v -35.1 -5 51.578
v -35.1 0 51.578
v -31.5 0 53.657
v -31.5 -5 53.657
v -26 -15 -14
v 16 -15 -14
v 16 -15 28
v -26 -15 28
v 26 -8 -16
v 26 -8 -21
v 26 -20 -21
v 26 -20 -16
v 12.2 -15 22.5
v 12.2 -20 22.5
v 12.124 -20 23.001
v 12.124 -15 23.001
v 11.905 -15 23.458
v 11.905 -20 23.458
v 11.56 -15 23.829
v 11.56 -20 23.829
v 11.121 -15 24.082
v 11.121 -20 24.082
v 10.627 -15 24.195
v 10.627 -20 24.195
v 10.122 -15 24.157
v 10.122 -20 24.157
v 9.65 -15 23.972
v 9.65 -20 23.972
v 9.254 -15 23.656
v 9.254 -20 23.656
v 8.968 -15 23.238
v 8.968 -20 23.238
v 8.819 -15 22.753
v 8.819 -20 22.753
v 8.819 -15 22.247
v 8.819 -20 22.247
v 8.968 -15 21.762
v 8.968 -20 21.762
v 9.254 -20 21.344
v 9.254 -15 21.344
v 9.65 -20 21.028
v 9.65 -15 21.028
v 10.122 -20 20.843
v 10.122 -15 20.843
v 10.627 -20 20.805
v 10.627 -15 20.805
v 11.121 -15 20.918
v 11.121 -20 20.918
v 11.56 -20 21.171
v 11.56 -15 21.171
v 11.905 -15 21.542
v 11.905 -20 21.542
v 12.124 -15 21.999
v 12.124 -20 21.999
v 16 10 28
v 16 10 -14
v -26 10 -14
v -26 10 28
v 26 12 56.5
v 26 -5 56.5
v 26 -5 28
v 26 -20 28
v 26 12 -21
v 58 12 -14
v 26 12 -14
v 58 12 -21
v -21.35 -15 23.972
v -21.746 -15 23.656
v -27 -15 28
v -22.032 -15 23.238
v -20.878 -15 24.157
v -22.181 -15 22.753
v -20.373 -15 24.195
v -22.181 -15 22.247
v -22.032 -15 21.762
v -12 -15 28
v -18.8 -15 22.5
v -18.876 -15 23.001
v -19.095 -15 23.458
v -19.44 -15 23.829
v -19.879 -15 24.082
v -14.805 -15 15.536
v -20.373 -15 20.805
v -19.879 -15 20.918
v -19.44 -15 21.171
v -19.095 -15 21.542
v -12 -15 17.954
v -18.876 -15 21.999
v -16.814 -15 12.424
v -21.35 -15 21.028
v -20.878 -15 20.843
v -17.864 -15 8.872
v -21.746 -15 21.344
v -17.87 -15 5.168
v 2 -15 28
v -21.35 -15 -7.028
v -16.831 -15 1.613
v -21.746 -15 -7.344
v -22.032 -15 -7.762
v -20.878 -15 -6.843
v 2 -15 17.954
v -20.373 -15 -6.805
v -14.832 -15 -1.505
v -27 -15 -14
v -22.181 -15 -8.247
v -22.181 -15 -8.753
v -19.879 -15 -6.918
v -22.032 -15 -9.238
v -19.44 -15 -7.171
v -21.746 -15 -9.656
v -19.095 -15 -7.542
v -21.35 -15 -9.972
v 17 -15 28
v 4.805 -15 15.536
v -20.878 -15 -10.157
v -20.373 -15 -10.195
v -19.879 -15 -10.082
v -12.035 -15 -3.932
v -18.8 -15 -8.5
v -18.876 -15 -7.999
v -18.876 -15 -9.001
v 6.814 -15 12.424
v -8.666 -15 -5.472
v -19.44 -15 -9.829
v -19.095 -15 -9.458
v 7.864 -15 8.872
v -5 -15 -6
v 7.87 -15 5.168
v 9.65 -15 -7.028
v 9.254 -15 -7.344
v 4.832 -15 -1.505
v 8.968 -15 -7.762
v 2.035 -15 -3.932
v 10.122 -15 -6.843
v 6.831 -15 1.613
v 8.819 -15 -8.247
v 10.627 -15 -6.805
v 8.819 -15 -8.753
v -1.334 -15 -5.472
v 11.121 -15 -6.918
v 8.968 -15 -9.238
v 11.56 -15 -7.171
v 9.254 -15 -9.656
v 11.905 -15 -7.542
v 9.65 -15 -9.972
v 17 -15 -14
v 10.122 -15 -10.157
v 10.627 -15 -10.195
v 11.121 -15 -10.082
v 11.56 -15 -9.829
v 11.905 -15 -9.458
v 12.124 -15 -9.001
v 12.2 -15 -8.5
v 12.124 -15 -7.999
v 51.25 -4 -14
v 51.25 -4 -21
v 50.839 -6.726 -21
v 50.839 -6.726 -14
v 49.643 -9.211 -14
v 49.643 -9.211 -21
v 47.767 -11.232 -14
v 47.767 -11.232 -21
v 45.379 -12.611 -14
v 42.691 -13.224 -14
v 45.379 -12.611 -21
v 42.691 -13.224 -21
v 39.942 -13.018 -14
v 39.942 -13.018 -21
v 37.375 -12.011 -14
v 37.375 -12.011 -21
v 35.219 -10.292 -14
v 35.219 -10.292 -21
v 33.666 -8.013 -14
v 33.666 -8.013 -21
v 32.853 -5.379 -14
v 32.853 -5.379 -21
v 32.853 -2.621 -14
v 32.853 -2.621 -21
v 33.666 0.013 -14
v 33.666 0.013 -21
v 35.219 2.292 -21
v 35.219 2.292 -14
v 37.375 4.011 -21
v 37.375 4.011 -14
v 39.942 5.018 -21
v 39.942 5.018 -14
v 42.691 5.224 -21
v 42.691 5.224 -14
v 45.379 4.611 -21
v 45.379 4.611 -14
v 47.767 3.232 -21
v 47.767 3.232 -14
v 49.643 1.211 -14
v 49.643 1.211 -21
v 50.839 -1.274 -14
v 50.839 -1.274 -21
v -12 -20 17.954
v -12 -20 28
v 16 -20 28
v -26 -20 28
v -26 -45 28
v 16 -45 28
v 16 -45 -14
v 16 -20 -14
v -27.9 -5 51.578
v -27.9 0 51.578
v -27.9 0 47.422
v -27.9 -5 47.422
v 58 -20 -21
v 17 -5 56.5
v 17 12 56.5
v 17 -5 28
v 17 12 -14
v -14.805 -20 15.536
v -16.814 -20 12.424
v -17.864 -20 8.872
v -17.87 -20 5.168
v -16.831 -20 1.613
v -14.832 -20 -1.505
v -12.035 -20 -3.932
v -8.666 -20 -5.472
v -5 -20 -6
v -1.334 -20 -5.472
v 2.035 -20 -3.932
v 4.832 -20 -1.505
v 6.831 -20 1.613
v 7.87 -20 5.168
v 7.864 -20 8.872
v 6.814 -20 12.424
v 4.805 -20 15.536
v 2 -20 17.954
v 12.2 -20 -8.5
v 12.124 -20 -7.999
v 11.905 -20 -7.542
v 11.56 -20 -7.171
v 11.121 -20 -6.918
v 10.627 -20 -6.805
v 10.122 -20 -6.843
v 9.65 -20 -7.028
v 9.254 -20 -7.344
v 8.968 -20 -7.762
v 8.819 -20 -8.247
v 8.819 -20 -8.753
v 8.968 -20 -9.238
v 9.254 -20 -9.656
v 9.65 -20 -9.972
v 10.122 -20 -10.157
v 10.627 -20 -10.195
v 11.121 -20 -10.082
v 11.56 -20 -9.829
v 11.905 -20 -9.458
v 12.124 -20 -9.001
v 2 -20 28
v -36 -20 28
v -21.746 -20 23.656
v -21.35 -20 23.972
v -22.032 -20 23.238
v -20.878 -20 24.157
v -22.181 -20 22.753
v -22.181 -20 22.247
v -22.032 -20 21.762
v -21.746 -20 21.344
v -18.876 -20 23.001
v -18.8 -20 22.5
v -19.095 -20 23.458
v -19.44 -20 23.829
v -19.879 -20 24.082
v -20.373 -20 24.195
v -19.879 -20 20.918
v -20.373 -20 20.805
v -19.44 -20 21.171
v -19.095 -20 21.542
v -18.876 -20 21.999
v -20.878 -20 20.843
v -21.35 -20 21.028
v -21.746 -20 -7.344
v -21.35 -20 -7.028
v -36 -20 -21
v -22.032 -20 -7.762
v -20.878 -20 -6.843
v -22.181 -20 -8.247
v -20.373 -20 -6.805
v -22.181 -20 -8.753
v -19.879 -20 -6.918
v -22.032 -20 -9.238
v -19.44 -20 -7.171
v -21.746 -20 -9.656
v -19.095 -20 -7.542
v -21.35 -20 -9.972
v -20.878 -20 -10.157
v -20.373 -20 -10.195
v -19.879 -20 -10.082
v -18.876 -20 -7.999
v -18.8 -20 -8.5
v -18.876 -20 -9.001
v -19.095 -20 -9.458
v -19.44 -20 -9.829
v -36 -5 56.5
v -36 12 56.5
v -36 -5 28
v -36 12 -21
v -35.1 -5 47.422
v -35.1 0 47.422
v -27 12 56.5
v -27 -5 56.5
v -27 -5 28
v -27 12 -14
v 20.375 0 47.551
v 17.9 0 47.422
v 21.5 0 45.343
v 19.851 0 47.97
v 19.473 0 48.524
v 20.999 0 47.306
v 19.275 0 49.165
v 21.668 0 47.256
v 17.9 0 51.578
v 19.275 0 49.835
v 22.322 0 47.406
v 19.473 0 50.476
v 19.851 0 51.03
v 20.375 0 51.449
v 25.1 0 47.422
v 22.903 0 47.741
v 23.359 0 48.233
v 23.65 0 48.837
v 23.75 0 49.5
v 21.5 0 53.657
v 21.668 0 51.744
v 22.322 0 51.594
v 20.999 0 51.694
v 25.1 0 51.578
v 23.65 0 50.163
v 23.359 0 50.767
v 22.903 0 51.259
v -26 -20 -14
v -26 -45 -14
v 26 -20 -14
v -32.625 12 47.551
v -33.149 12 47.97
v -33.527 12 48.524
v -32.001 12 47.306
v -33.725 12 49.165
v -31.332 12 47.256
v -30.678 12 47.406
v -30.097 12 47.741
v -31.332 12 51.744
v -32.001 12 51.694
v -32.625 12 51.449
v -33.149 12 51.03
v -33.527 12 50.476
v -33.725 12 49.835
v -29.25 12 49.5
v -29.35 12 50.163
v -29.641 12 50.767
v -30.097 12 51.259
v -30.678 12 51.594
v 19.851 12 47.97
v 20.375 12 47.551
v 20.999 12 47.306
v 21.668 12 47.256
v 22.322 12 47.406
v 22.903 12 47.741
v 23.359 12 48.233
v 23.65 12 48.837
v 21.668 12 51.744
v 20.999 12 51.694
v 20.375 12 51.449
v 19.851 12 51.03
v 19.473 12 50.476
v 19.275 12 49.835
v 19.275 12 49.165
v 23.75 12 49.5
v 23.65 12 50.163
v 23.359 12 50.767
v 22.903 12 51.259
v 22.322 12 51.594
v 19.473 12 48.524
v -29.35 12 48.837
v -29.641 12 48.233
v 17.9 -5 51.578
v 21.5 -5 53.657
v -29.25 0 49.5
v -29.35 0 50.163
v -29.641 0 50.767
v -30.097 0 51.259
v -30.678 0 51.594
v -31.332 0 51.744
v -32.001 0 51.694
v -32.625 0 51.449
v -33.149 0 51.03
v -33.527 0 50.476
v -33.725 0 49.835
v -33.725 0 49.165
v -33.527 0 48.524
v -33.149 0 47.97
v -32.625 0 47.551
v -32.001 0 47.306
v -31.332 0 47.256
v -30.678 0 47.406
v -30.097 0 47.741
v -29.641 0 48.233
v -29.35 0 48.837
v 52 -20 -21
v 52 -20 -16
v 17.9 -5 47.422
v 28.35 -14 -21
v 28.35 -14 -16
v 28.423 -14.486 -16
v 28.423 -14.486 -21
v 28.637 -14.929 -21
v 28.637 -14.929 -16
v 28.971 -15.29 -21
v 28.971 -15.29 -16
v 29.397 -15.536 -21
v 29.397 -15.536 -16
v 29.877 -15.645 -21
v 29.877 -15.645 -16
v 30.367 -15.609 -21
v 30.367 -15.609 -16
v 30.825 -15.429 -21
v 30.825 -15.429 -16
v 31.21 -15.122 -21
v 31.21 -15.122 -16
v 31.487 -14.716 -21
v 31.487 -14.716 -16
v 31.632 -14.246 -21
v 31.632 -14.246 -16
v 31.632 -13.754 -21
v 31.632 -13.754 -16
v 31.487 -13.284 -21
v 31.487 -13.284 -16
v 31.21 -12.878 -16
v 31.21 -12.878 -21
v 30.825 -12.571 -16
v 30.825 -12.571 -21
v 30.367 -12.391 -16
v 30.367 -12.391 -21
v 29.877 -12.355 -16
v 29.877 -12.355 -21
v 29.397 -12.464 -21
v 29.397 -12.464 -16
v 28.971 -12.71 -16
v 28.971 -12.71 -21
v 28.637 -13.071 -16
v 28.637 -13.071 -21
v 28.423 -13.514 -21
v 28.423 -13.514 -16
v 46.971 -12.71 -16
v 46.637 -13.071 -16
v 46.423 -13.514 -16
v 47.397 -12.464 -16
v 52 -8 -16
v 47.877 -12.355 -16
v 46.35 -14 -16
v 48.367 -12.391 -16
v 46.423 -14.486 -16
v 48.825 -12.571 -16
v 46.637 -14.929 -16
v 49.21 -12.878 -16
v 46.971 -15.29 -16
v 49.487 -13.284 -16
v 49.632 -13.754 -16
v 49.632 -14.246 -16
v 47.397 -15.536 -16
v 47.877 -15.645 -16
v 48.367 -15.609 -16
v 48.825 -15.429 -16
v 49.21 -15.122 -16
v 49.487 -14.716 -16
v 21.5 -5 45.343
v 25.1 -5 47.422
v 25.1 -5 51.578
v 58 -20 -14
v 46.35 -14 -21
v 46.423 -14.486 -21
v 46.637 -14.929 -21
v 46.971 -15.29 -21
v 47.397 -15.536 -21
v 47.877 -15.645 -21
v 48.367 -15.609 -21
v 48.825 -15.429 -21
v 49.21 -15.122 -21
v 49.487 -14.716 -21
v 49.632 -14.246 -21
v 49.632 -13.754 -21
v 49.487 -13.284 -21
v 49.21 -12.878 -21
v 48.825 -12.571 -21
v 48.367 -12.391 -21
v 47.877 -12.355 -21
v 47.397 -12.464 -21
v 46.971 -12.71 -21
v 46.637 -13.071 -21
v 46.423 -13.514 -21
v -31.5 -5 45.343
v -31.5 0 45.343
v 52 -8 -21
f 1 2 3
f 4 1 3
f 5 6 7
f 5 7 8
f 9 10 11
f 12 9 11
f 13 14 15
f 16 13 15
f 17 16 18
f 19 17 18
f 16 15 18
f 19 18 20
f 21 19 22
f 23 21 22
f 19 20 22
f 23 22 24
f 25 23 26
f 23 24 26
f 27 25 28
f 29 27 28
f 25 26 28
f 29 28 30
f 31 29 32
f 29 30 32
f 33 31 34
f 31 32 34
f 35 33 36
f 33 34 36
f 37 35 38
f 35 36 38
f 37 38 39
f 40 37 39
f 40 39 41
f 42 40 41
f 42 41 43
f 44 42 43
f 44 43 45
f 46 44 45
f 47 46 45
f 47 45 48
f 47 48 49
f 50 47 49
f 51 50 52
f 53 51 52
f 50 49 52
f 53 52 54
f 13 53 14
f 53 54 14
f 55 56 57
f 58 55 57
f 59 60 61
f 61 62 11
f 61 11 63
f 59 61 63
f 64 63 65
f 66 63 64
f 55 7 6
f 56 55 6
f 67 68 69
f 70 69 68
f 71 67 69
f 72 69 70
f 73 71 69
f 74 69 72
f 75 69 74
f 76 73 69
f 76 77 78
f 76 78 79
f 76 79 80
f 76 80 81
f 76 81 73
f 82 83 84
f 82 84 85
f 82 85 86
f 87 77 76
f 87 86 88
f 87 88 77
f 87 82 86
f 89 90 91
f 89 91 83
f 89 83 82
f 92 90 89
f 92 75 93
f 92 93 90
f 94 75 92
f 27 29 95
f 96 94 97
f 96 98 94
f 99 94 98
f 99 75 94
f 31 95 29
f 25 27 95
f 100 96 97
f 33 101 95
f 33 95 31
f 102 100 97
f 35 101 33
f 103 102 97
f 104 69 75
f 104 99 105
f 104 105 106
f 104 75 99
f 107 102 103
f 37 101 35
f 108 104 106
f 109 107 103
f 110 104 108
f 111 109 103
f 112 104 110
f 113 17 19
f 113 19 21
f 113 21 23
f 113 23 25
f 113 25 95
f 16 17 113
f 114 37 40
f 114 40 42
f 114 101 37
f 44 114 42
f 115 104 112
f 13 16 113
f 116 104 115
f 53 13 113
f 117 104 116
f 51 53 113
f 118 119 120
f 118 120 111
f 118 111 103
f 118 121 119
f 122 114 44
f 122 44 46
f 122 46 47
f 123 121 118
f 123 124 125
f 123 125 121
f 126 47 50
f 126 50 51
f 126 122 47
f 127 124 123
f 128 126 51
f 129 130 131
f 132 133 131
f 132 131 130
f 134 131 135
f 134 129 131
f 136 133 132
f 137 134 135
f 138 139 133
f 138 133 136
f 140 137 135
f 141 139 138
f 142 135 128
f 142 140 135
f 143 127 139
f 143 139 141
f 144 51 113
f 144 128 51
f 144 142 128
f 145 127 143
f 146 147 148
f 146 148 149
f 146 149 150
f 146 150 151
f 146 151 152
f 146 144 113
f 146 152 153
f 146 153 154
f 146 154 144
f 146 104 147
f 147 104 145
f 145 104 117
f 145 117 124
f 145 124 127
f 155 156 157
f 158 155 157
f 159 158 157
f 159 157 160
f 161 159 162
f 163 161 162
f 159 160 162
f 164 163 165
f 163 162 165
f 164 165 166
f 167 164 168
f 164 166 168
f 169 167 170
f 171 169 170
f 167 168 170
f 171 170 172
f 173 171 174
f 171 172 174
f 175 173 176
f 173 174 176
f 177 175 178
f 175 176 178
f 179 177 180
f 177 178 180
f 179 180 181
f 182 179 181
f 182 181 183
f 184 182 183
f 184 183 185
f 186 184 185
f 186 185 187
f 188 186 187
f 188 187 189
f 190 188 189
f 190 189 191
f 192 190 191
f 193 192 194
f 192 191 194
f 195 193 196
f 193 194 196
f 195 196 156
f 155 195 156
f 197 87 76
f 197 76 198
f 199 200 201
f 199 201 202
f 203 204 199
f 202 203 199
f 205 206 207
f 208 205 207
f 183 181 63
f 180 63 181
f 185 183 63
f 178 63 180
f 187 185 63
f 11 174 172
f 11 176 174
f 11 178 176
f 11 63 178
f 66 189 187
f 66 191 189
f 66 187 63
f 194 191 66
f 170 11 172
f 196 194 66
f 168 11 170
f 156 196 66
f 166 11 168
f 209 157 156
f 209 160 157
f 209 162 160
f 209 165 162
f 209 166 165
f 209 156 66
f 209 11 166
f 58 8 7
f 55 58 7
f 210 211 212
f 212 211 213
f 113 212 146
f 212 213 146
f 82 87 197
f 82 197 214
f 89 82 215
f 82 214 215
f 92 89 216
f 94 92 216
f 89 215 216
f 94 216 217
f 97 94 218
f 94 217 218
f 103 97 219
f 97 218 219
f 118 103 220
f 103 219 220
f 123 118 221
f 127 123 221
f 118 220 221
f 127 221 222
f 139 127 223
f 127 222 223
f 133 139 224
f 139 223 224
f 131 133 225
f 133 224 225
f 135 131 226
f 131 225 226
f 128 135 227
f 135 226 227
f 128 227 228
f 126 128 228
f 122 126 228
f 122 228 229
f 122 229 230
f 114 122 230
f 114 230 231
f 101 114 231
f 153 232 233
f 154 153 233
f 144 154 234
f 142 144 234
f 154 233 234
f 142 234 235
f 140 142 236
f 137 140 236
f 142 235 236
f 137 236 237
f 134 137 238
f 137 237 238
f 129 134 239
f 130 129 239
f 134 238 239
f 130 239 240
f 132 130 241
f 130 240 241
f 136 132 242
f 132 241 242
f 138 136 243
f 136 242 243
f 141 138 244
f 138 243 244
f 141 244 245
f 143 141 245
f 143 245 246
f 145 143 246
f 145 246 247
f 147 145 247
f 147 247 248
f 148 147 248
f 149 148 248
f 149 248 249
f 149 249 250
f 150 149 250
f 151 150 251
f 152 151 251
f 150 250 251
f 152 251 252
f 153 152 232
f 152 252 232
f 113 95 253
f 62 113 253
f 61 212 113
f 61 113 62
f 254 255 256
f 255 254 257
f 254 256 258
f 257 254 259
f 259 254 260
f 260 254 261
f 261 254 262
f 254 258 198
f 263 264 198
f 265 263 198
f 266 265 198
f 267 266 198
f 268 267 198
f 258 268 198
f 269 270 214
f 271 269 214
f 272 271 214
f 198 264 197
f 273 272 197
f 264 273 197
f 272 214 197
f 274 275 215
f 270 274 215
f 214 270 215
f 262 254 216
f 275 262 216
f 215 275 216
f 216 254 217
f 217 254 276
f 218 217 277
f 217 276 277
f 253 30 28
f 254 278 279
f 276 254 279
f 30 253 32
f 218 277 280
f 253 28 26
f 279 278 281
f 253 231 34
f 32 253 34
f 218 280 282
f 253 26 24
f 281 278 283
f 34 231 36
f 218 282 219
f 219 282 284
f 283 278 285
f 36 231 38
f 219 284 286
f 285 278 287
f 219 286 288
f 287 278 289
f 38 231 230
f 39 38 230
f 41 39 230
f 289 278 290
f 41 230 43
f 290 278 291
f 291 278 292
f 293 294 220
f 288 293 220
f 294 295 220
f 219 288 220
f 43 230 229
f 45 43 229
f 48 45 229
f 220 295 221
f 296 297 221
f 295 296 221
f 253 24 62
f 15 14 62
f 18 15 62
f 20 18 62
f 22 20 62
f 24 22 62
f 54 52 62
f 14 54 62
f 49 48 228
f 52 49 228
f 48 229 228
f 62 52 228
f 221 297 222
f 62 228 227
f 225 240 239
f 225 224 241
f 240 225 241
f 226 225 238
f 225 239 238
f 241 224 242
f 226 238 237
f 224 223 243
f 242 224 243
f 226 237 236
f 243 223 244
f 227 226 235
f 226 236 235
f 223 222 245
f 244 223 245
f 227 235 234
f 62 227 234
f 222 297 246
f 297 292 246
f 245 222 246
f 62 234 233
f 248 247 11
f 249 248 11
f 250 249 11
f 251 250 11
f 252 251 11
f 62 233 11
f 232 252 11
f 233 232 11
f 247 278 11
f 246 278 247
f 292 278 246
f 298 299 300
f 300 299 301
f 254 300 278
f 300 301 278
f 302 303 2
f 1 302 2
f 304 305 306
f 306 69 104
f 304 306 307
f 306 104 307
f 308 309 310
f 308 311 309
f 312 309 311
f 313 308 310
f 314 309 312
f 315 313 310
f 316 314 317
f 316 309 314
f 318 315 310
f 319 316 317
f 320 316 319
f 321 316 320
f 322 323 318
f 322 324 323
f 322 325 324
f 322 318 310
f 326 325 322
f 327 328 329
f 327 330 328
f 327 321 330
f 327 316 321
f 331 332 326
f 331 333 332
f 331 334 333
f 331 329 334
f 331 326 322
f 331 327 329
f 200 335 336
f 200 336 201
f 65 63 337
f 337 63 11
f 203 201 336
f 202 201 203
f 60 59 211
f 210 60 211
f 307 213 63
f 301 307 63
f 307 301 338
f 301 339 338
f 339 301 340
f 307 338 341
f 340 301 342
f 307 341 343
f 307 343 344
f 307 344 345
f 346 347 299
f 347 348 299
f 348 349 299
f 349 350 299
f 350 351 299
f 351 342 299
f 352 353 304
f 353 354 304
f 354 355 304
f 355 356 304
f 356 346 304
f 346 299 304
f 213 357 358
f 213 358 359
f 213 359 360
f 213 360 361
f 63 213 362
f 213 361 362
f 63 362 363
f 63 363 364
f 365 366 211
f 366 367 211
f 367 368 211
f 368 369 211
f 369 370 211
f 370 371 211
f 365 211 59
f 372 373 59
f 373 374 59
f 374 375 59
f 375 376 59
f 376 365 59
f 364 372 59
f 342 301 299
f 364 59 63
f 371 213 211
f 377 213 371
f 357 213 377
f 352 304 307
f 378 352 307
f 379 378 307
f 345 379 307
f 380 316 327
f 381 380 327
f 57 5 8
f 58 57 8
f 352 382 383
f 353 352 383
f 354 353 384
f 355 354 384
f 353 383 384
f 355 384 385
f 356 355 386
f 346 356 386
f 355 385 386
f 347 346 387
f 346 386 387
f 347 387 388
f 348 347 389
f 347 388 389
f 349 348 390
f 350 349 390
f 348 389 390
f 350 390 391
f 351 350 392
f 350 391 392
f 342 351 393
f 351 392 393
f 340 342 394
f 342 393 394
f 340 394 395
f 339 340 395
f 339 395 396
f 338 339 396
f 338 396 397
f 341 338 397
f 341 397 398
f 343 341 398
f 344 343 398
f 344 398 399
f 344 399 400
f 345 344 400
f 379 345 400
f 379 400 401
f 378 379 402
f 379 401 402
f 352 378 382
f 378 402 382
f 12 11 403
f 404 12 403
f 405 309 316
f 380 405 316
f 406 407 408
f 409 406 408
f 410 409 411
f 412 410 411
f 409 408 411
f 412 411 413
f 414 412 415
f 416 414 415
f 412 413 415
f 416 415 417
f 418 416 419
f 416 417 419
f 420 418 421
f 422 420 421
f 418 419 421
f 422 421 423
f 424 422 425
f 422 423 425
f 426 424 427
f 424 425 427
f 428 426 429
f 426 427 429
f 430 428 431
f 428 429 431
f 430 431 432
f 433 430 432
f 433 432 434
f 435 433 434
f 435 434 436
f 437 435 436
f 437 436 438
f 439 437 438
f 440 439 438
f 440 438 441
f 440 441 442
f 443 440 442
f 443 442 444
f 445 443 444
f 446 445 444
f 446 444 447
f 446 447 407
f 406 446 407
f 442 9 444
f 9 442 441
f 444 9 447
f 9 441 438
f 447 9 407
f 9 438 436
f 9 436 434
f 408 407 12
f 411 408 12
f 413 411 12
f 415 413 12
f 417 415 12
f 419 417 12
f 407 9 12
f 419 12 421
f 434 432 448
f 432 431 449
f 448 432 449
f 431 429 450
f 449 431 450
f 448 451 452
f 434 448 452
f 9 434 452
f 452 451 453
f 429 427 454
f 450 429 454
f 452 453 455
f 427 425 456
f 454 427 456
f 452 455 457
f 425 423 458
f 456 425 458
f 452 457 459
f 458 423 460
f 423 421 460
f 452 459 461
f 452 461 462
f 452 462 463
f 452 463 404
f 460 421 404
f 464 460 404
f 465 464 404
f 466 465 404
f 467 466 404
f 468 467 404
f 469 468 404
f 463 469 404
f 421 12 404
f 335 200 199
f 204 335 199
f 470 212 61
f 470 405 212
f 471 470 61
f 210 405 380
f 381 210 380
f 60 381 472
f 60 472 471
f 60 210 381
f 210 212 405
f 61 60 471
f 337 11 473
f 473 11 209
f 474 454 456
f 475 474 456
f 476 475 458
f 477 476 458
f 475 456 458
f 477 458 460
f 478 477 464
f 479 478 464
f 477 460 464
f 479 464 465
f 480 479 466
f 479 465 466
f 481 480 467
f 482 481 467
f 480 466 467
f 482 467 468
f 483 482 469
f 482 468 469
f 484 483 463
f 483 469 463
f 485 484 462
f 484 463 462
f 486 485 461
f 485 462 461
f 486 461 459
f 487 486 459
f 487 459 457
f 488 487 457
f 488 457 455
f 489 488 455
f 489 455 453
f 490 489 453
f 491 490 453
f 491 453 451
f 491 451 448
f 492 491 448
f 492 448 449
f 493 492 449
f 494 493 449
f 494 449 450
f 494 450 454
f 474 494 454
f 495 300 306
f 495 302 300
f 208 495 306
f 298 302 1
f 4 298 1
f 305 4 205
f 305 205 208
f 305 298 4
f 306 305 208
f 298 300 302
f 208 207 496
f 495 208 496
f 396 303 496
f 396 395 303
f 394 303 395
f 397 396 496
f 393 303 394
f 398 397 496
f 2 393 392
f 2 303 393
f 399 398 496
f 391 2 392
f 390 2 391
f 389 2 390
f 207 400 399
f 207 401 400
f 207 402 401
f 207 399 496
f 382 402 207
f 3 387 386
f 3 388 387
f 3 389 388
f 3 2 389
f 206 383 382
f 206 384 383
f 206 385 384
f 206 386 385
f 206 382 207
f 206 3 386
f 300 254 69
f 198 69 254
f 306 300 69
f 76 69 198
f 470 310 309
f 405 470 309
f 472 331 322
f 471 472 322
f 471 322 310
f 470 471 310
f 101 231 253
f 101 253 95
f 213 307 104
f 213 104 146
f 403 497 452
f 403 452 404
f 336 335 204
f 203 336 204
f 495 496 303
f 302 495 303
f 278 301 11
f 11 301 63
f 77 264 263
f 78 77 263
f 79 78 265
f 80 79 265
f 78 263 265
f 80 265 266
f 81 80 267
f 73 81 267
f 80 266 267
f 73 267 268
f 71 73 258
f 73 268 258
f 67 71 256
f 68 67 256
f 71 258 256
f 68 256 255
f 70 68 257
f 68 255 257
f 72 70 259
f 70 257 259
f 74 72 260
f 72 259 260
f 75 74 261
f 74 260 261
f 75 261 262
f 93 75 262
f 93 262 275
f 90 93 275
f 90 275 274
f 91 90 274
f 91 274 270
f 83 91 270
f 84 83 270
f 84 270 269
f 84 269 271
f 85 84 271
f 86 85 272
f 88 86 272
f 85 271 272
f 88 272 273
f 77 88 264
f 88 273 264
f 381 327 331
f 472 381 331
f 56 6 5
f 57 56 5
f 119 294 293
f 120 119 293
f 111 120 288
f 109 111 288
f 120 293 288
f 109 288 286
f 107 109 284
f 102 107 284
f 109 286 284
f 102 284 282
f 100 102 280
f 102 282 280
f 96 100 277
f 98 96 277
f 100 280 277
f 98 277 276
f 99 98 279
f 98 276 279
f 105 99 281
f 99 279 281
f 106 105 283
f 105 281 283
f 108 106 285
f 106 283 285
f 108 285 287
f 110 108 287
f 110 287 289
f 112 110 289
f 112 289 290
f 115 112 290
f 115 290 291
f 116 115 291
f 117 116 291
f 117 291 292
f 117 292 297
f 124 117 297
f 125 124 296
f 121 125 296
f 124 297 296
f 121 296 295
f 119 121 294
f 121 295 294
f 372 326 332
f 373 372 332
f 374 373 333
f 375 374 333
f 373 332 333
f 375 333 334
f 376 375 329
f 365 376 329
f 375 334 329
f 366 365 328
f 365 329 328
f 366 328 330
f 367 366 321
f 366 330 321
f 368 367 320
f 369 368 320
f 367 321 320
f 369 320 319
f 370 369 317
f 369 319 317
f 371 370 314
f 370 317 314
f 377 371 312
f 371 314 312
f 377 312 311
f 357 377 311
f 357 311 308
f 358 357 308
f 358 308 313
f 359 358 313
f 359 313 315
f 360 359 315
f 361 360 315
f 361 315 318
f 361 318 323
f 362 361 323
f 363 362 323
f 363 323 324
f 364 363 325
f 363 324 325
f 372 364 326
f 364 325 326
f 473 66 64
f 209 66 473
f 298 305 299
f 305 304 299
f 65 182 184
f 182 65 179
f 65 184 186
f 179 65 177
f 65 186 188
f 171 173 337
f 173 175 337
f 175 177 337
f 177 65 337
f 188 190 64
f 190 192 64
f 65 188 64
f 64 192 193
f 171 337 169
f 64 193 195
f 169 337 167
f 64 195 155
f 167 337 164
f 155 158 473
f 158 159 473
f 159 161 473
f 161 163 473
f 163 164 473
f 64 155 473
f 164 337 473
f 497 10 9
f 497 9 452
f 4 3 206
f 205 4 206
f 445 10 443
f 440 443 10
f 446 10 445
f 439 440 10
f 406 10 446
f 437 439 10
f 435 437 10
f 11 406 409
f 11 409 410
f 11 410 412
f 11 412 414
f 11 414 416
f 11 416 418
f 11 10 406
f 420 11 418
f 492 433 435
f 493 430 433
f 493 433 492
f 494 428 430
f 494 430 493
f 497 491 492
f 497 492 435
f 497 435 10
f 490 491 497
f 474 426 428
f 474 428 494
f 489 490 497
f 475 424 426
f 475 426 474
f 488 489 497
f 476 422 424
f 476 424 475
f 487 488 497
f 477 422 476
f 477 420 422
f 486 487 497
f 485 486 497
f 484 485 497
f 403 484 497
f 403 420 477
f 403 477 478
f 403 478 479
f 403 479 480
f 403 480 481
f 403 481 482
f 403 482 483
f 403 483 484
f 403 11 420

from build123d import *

# Parameters (mm, degrees)
F1_R      = 2.25
F2_DEPTH  = 12
F4_DEPTH  = 5
F5_W      = 44
F5_H      = 10
F5_H_2    = 5
F6_DEPTH  = 7
F7_DEPTH  = 42
F8_R      = 1.7
F8_R_2    = 13
F9_DEPTH  = 5
F11_REACH = 63.8670687473
F12_R     = 1.7
F13_DEPTH = 25
F14_W     = 42
F14_H     = 42
F14_R     = 1.7
F14_R_2   = 13
F15_DEPTH = 25
F16_W     = 32
F16_H     = 32
F16_R     = 9.25
F17_DEPTH = 7
F18_W     = 26
F18_H     = 12
F19_DEPTH = 5
F20_D     = 3.3


with BuildPart() as f2:
    # F1 (on Front) → F2 (new body)
    with BuildSketch(Plane.XZ):
        Polygon((-27, 56.5), (-36, 56.5), (-36, -21), (26, -21), (26, 56.5), (17, 56.5), (17, -14), (-27, -14), align=None)
        with Locations((-31.5, 49.5)):
            Circle(F1_R, mode=Mode.SUBTRACT)
        with Locations((21.5, 49.5)):
            Circle(F1_R, mode=Mode.SUBTRACT)
    extrude(amount=-F2_DEPTH)

    # F3 (on face) → F4 (join)
    with BuildSketch(Plane.XZ):
        Polygon((-27, -14), (-27, 56.5), (-36, 56.5), (-36, -21), (26, -21), (26, 56.5), (17, 56.5), (17, -14), align=None)
        Polygon((-31.5, 53.6569219382), (-27.9, 51.5784609691), (-27.9, 47.4215390309), (-31.5, 45.3430780618), (-35.1, 47.4215390309), (-35.1, 51.5784609691), align=None, mode=Mode.SUBTRACT)
        Polygon((21.5, 53.6569219382), (25.1, 51.5784609691), (25.1, 47.4215390309), (21.5, 45.3430780618), (17.9, 47.4215390309), (17.9, 51.5784609691), align=None, mode=Mode.SUBTRACT)
    extrude(amount=F4_DEPTH)

    # F5 (on face) → F6 (join, through all)
    with BuildSketch(Plane.XY.offset(-14)):
        with Locations((-5, -10)):
            Rectangle(F5_W, F5_H)
        with Locations((-5, -17.5)):
            Rectangle(F5_W, F5_H_2)
        Polygon((-27, -15), (-27, -5), (-36, -5), (-36, -20), (-27, -20), align=None)
        Polygon((26, -5), (17, -5), (17, -15), (17, -20), (26, -20), align=None)
    extrude(amount=-F6_DEPTH)

    # F5 (on face) → F7 (join)
    with BuildSketch(Plane.XY.offset(-14)):
        with Locations((-5, -17.5)):
            Rectangle(F5_W, F5_H_2)
        Polygon((-27, -15), (-27, -5), (-36, -5), (-36, -20), (-27, -20), align=None)
        Polygon((26, -5), (17, -5), (17, -15), (17, -20), (26, -20), align=None)
    extrude(amount=F7_DEPTH)

    # F8 (on face) → F9 (cut, through all)
    with BuildSketch(Plane.XZ.offset(20)):
        with Locations((-20.5, 22.5)):
            Circle(F8_R)
        with Locations((-5, 7)):
            Circle(F8_R_2)
        with Locations((-20.5, -8.5)):
            Circle(F8_R)
        with Locations((10.5, -8.5)):
            Circle(F8_R)
        with Locations((10.5, 22.5)):
            Circle(F8_R)
    extrude(amount=-F9_DEPTH, mode=Mode.SUBTRACT)

    f11_end = f2.faces().sort_by_distance((-18, -17.5, 7))[0]
    # F10 (on face) → F11 (cut, up to a face of the model that its end follows)
    with BuildSketch(Plane.XY.offset(28)):
        Polygon((2, -15), (-5, -15), (-12, -15), (-12, -20), (2, -20), align=None)
    f11_long = extrude(amount=-F11_REACH, mode=Mode.PRIVATE)
    add(split(f11_long, bisect_by=f11_end, keep=Keep.ALL, mode=Mode.PRIVATE).solids().sort_by_distance((-5, -17.5, 28))[0], mode=Mode.SUBTRACT)


with BuildPart() as f13:
    # F12 (on face) → F13 (new body)
    with BuildSketch(Plane(origin=(0, -15, 0), x_dir=(-1, 0, 0), z_dir=(0, 1, 0))):
        with BuildLine():
            Line((-16, -14), (26, -14))
            Line((26, -14), (26, 28))
            Line((26, 28), (12, 28))
            Line((12, 28), (12, 17.9544511501))
            ThreePointArc((12, 17.9544511501), (5, -6), (-2, 17.9544511501))
            Line((-2, 17.9544511501), (-2, 28))
            Line((-2, 28), (-16, 28))
            Line((-16, 28), (-16, -14))
        make_face()
        with Locations((-10.5, -8.5)):
            Circle(F12_R, mode=Mode.SUBTRACT)
        with Locations((20.5, -8.5)):
            Circle(F12_R, mode=Mode.SUBTRACT)
        with Locations((-10.5, 22.5)):
            Circle(F12_R, mode=Mode.SUBTRACT)
        with Locations((20.5, 22.5)):
            Circle(F12_R, mode=Mode.SUBTRACT)
        with BuildLine():
            Line((12, 17.9544511501), (12, 28))
            Line((12, 28), (-2, 28))
            Line((-2, 28), (-2, 17.9544511501))
            ThreePointArc((-2, 17.9544511501), (5, -6), (12, 17.9544511501))
        make_face()
        with Locations((-10.5, 22.5)):
            Circle(F12_R)
        with Locations((20.5, 22.5)):
            Circle(F12_R)
        with Locations((-10.5, -8.5)):
            Circle(F12_R)
        with Locations((20.5, -8.5)):
            Circle(F12_R)
    extrude(amount=F13_DEPTH)


with BuildPart() as f15:
    # F14 (on face) → F15 (new body)
    with BuildSketch(Plane.XZ.offset(20)):
        with Locations((-5, 7)):
            Rectangle(F14_W, F14_H)
        with Locations((-20.5, -8.5)):
            Circle(F14_R, mode=Mode.SUBTRACT)
        with Locations((10.5, -8.5)):
            Circle(F14_R, mode=Mode.SUBTRACT)
        with Locations((-20.5, 22.5)):
            Circle(F14_R, mode=Mode.SUBTRACT)
        with Locations((-5, 7)):
            Circle(F14_R_2, mode=Mode.SUBTRACT)
        with Locations((10.5, 22.5)):
            Circle(F14_R, mode=Mode.SUBTRACT)
    extrude(amount=F15_DEPTH)

    # F8 (on face) → F15, piece 2 (join)
    with BuildSketch(Plane.XZ.offset(20)):
        with Locations((-20.5, 22.5)):
            Circle(F8_R)
    extrude(amount=F15_DEPTH)

    # F8 (on face) → F15, piece 3 (join)
    with BuildSketch(Plane.XZ.offset(20)):
        with Locations((-5, 7)):
            Circle(F8_R_2)
    extrude(amount=F15_DEPTH)

    # F8 (on face) → F15, piece 4 (join)
    with BuildSketch(Plane.XZ.offset(20)):
        with Locations((-20.5, -8.5)):
            Circle(F8_R)
    extrude(amount=F15_DEPTH)

    # F8 (on face) → F15, piece 5 (join)
    with BuildSketch(Plane.XZ.offset(20)):
        with Locations((10.5, 22.5)):
            Circle(F8_R)
    extrude(amount=F15_DEPTH)

    # F8 (on face) → F15, piece 6 (join)
    with BuildSketch(Plane.XZ.offset(20)):
        with Locations((10.5, -8.5)):
            Circle(F8_R)
    extrude(amount=F15_DEPTH)


with BuildPart() as f17:
    # F16 (on face) → F17 (new body, through all)
    with BuildSketch(Plane(origin=(0, 0, -21), x_dir=(1, 0, 0), z_dir=(0, 0, -1))):
        with Locations((42, 4)):
            Rectangle(F16_W, F16_H)
        with Locations((42, 4)):
            Circle(F16_R, mode=Mode.SUBTRACT)
    extrude(amount=-F17_DEPTH)


with BuildPart() as f19:
    # F18 (on face) → F19 (new body)
    with BuildSketch(Plane(origin=(0, 0, -21), x_dir=(1, 0, 0), z_dir=(0, 0, -1))):
        with Locations((39, 14)):
            Rectangle(F18_W, F18_H)
    extrude(amount=-F19_DEPTH)

    # F20 (through all)
    with Locations(Plane(origin=(0, 0, -21), x_dir=(1, 0, 0), z_dir=(0, 0, -1))):
        with Locations((30, 14), (48, 14)):
            Hole(F20_D / 2)


solid = Compound([f2.part, f13.part, f15.part, f17.part, f19.part])
